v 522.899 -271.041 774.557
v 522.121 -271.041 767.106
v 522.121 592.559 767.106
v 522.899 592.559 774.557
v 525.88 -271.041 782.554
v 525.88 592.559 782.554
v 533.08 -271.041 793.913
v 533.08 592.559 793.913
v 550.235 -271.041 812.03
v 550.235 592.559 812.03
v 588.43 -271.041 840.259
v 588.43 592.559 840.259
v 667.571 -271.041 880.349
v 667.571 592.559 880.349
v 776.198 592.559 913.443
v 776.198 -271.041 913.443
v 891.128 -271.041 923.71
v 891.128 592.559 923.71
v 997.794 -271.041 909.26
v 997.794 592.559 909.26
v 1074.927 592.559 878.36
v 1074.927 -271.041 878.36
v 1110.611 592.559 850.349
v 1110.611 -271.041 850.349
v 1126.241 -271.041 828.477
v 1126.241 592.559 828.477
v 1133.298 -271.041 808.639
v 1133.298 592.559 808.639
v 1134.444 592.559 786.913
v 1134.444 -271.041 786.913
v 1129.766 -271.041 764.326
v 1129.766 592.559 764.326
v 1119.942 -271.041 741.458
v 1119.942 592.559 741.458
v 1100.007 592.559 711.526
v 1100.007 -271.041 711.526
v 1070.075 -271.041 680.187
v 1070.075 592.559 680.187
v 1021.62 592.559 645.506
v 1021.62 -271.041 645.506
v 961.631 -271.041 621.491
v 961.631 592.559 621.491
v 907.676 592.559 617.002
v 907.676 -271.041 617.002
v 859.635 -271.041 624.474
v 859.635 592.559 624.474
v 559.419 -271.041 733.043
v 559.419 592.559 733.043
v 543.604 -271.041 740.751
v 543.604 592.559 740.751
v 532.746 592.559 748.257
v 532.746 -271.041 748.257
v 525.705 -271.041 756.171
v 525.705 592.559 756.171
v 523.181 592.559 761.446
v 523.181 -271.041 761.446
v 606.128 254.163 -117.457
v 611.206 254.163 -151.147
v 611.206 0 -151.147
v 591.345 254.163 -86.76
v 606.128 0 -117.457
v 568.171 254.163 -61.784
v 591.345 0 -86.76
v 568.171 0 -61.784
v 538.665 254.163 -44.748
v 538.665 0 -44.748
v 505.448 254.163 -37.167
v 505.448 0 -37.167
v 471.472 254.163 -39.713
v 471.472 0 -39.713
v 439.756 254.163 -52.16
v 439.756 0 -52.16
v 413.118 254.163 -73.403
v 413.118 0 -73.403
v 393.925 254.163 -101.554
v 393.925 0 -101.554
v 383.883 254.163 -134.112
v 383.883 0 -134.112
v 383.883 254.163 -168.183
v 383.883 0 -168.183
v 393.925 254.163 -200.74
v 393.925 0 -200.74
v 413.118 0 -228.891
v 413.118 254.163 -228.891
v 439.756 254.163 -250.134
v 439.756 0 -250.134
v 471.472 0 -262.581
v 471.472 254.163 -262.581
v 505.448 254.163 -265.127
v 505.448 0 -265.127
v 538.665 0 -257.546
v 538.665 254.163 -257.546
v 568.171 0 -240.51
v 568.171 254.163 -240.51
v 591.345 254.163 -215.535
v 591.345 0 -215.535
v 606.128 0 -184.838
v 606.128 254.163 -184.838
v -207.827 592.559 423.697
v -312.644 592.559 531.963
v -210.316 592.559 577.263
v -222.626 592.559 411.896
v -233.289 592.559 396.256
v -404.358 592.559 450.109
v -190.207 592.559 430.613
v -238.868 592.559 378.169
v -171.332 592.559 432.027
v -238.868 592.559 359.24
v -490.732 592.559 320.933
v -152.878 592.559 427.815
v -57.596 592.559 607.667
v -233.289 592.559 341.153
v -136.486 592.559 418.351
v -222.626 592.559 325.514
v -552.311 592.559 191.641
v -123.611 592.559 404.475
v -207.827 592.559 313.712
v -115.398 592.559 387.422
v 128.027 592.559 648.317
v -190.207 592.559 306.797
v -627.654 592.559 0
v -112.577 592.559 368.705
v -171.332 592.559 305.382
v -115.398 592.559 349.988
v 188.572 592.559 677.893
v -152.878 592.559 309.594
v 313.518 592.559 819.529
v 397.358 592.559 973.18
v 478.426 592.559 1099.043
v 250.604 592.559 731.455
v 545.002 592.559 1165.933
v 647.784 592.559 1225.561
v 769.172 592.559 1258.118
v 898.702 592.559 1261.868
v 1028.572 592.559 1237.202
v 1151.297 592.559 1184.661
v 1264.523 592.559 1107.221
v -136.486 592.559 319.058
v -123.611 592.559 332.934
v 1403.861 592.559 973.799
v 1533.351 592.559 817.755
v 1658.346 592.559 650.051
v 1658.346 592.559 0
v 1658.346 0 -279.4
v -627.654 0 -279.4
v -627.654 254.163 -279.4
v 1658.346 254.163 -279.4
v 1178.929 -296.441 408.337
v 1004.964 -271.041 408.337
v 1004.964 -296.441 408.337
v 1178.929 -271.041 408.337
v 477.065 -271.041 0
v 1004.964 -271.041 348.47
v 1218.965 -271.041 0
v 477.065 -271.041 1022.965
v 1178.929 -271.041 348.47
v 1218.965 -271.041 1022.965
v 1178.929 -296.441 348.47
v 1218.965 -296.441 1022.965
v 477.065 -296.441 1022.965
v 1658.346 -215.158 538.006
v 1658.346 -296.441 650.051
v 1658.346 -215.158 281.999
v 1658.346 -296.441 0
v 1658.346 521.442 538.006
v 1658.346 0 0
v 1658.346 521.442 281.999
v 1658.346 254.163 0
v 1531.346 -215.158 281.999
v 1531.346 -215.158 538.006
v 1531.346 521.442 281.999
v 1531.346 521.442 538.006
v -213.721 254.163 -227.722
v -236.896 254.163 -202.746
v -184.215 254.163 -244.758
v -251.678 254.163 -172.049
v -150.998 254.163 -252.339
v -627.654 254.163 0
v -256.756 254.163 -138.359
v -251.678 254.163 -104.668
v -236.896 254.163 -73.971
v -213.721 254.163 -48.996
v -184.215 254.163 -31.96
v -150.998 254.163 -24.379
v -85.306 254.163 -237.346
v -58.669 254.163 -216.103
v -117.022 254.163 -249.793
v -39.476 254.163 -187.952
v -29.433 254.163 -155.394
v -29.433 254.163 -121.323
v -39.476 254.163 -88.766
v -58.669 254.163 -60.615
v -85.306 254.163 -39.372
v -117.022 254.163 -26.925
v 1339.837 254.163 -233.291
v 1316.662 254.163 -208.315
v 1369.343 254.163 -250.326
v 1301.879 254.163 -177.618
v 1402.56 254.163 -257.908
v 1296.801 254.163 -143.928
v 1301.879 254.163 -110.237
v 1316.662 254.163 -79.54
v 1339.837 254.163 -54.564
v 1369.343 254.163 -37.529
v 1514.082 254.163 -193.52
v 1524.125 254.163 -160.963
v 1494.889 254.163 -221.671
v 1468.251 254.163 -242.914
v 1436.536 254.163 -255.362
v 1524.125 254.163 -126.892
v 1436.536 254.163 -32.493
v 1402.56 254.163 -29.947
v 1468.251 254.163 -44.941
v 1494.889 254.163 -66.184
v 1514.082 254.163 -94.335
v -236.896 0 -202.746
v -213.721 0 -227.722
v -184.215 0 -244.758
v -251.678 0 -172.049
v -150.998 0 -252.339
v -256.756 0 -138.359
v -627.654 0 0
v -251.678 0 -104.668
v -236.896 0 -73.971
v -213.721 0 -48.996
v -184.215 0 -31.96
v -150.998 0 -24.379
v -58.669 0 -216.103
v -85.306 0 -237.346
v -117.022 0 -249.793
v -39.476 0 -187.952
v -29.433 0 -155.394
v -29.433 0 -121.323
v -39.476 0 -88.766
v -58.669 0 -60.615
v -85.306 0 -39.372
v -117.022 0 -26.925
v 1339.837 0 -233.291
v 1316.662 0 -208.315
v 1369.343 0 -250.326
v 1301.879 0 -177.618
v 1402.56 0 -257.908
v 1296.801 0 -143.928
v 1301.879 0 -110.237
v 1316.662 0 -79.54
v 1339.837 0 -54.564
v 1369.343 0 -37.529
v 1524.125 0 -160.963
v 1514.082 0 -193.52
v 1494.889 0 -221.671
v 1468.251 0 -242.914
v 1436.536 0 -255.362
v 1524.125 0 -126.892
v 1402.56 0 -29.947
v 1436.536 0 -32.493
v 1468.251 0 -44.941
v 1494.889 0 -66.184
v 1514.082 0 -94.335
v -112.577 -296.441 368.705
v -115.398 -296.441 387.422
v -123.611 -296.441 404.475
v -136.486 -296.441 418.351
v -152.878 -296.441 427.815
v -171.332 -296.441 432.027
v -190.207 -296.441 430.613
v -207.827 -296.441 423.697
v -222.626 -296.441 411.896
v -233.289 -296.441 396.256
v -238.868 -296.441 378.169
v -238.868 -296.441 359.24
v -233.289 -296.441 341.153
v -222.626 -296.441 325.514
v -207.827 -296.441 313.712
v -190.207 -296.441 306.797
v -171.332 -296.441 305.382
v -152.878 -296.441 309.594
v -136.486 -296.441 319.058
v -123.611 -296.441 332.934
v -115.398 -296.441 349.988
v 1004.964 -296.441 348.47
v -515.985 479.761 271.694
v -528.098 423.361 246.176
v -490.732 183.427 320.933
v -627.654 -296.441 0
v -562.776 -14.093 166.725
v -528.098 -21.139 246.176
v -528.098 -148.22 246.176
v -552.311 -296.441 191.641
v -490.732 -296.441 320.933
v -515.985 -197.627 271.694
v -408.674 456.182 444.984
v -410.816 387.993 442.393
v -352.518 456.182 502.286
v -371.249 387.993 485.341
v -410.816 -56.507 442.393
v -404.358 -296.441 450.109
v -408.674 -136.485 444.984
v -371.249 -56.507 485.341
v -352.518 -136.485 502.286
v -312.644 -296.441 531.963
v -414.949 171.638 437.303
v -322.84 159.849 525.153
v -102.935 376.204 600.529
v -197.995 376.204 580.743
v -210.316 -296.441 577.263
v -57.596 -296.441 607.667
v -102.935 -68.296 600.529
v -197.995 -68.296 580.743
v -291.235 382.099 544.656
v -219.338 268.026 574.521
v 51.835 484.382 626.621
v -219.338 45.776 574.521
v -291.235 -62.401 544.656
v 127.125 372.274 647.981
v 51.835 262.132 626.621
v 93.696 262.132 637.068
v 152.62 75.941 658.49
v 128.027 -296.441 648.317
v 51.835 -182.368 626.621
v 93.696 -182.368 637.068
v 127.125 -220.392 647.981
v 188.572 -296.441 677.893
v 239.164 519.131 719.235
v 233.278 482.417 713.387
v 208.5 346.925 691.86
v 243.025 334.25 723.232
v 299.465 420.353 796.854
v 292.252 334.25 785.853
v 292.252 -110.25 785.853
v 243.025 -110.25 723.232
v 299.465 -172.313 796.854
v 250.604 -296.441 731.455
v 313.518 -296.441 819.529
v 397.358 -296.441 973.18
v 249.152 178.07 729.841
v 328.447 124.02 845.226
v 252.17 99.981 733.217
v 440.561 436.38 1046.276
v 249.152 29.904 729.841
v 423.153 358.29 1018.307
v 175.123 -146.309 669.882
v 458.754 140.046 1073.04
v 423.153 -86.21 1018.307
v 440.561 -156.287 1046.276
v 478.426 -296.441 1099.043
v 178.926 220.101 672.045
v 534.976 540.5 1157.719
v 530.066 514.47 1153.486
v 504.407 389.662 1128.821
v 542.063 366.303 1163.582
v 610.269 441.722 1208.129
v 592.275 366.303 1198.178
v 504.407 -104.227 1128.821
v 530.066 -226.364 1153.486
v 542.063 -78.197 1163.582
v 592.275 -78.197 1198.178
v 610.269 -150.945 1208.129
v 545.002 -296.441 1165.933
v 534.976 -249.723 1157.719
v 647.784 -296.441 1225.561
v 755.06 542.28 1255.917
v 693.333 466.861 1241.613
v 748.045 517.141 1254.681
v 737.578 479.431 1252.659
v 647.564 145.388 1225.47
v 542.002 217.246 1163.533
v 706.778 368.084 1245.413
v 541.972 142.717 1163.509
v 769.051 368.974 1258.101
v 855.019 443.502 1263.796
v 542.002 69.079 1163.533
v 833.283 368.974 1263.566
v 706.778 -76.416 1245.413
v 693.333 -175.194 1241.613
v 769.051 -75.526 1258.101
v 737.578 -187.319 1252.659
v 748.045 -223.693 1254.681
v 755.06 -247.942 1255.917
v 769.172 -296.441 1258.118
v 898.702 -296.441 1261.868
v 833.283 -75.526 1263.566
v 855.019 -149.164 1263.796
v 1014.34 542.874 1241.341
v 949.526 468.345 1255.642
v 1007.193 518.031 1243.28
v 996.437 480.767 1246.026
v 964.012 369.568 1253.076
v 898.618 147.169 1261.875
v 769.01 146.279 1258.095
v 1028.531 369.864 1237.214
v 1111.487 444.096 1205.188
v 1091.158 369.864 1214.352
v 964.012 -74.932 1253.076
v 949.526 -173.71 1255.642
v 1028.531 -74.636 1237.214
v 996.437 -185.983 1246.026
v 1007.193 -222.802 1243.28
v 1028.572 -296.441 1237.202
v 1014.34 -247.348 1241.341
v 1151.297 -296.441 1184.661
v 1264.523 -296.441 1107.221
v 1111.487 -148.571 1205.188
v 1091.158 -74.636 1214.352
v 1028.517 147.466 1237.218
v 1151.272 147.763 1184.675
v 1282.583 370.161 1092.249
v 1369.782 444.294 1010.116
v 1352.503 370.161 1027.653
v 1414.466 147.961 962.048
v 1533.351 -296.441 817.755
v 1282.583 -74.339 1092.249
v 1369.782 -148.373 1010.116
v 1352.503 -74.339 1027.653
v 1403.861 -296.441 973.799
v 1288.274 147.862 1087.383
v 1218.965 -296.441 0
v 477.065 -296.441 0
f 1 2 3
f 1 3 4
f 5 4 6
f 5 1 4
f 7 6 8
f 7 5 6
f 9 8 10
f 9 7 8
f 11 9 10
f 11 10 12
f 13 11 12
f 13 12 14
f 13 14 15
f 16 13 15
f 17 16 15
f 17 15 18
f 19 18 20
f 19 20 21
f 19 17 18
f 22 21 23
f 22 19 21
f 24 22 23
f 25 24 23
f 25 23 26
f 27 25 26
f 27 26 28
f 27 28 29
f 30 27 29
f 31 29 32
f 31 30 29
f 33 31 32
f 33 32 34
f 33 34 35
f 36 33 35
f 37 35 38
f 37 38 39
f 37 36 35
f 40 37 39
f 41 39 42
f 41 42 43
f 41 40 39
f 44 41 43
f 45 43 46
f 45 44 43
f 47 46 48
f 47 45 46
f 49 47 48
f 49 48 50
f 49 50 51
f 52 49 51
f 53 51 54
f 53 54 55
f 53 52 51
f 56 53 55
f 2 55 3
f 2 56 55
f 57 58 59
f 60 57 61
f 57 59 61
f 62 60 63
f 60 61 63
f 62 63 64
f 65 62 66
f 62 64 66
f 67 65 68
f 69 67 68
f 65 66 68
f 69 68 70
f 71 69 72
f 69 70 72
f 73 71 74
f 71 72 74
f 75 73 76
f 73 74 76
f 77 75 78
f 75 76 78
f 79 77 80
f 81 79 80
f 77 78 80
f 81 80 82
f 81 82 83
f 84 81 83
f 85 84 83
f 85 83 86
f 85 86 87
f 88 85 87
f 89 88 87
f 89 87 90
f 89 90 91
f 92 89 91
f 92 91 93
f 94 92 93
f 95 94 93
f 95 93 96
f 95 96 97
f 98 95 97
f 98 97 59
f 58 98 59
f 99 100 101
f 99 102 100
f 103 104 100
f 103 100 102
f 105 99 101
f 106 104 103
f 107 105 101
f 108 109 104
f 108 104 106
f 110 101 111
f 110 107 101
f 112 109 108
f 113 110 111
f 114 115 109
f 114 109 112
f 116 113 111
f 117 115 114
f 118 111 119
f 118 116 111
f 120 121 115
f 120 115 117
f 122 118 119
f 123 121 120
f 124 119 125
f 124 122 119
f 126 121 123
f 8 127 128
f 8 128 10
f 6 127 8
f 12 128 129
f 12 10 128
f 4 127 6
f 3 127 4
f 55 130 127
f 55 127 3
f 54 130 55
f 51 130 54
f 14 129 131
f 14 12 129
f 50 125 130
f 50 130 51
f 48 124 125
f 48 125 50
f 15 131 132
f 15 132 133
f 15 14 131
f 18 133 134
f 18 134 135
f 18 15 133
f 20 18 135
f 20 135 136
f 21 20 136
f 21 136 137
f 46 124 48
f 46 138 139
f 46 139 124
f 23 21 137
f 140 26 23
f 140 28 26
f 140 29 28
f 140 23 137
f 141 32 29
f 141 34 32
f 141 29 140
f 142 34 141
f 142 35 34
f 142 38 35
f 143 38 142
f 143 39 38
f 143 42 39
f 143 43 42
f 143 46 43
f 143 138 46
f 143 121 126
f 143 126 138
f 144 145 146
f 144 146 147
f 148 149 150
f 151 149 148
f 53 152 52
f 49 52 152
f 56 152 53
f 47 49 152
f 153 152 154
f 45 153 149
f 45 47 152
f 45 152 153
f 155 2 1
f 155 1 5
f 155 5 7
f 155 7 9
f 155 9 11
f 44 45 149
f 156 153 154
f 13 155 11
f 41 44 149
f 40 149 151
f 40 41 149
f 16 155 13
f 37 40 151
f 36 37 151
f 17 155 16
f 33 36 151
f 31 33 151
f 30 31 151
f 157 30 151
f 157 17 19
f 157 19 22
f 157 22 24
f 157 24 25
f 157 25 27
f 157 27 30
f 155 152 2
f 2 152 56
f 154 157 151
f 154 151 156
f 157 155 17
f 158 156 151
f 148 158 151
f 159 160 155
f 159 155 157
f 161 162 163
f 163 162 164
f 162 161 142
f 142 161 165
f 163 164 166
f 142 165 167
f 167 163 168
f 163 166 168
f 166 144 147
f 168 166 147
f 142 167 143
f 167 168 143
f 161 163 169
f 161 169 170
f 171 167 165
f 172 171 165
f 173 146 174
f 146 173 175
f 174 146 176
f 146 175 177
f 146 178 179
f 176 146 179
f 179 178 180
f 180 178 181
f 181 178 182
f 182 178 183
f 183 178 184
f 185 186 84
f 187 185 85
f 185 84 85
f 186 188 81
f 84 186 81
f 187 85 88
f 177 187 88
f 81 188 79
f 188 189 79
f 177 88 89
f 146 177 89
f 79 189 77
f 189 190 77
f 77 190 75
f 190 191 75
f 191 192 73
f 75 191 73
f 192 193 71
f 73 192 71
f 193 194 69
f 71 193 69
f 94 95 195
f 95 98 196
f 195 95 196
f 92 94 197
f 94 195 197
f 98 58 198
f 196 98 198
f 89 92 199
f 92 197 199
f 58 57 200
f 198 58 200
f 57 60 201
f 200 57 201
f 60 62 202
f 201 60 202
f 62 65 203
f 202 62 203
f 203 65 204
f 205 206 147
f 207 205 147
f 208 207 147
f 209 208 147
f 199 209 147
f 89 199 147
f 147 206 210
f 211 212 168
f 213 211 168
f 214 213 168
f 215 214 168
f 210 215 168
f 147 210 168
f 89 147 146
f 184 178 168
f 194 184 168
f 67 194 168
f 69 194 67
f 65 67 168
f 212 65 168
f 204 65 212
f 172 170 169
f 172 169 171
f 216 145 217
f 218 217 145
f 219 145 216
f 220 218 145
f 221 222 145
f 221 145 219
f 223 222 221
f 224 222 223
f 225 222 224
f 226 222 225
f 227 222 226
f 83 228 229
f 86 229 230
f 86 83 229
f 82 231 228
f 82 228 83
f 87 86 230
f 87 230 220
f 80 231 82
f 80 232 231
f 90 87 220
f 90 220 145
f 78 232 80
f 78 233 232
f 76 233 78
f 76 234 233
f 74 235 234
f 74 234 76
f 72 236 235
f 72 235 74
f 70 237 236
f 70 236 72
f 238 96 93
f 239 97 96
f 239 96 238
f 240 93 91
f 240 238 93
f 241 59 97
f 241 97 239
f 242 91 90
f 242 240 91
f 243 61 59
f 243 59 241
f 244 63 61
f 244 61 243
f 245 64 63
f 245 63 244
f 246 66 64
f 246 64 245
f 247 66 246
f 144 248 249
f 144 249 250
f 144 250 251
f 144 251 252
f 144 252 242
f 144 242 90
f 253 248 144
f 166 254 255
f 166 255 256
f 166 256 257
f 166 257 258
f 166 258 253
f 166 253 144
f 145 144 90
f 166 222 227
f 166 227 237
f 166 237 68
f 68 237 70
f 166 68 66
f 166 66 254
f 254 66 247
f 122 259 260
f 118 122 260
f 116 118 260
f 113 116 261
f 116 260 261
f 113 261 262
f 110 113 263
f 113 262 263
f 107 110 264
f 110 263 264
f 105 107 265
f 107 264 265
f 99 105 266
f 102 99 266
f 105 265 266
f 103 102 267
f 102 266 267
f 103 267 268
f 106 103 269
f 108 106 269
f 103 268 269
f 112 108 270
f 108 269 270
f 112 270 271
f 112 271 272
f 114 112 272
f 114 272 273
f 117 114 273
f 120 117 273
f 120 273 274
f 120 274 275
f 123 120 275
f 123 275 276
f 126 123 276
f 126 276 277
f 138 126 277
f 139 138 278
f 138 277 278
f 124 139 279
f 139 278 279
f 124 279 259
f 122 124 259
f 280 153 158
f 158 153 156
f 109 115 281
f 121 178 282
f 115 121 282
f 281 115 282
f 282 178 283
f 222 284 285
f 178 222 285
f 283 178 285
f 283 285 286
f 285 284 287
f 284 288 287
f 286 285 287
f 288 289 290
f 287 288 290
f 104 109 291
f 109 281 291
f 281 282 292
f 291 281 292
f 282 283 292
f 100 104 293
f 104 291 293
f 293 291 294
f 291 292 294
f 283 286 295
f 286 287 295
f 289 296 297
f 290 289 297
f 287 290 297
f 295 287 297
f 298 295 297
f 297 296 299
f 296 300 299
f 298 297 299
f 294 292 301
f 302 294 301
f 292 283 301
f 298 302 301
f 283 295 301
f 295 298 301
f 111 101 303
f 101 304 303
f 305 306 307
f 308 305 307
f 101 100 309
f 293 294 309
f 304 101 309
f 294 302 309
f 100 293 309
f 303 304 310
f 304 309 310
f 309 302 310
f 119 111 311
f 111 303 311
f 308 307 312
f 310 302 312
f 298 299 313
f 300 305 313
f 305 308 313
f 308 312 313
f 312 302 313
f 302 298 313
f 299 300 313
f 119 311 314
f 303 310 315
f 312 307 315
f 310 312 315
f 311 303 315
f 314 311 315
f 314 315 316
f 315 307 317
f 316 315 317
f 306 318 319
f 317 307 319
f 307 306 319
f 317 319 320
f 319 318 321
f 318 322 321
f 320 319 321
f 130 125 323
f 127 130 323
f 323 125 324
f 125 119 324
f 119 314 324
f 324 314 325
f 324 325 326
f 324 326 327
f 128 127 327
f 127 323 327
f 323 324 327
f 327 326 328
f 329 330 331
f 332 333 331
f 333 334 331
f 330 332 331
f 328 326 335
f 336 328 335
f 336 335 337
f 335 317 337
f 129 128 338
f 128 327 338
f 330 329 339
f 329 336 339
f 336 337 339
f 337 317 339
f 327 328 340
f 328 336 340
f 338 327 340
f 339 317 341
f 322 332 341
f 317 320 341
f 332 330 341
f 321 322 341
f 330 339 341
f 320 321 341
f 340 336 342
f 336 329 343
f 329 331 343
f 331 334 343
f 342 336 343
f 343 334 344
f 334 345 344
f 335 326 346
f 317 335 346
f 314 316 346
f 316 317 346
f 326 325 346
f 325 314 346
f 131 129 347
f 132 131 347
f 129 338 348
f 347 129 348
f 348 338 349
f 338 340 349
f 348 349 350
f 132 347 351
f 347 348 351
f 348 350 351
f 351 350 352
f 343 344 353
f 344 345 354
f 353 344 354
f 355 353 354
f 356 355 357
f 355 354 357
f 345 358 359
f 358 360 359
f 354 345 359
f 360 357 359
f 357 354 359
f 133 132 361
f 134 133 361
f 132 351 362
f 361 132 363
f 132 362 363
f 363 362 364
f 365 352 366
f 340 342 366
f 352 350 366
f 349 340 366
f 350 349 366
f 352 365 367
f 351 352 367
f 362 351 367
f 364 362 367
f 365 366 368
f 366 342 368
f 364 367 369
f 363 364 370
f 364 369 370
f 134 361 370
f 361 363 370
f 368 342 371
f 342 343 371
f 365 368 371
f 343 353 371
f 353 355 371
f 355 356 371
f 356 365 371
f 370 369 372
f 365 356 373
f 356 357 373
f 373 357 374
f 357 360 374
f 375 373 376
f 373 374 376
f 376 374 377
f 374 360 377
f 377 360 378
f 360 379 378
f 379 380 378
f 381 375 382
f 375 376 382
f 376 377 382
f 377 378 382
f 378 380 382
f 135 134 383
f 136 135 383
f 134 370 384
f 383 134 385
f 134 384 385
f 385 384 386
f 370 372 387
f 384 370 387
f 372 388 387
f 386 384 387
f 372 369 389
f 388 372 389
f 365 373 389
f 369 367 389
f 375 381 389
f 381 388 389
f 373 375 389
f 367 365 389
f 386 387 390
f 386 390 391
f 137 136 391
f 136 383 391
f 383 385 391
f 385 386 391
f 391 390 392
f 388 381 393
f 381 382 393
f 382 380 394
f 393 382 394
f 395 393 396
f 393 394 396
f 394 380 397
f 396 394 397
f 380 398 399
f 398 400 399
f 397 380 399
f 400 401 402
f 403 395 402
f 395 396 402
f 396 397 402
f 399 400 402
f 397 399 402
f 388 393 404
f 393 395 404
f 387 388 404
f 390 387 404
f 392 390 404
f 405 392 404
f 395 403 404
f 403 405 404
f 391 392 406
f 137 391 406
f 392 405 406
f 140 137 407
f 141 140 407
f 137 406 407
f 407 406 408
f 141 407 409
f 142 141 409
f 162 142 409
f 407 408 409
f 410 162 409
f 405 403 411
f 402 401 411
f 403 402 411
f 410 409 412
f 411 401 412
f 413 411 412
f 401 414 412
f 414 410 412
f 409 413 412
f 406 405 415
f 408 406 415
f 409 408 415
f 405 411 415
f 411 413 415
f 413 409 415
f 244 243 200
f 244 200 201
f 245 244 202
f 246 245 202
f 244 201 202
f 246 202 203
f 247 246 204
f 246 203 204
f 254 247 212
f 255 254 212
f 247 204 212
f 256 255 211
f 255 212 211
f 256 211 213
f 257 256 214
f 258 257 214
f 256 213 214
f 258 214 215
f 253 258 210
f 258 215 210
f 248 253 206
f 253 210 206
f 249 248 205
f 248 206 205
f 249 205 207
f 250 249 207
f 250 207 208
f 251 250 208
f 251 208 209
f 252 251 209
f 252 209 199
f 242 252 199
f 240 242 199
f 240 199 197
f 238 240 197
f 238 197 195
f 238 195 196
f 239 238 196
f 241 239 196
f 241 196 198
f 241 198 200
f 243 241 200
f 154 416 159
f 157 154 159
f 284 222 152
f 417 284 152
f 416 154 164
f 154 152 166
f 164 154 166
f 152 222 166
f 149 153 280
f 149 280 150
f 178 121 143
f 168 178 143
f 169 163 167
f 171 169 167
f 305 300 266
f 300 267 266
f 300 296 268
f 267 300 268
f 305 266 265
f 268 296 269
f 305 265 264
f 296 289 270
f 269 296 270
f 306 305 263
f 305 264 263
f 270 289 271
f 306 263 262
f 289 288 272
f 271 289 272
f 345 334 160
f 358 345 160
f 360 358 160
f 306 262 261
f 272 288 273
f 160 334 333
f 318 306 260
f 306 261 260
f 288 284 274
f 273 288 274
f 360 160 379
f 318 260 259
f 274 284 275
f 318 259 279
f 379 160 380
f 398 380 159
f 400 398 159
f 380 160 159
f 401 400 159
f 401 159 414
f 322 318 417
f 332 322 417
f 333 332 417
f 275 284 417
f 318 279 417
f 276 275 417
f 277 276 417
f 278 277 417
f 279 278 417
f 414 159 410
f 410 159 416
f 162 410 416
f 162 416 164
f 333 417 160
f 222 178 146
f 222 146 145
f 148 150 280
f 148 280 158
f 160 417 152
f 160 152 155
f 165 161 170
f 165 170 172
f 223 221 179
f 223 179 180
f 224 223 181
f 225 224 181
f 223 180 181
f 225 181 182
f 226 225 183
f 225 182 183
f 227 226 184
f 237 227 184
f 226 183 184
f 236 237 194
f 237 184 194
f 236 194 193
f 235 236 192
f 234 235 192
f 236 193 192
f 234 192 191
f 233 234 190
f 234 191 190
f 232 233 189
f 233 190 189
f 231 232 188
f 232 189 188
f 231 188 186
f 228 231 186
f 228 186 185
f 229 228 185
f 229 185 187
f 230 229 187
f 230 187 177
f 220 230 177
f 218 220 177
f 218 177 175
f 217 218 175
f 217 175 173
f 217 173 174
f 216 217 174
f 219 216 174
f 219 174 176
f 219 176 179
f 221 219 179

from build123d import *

# Parameters (mm, degrees)
F0_W      = 2286
F0_H      = 889
F1_DEPTH  = 1778
F3_DEPTH  = 889
F5_DEPTH  = 889
F6_W      = 736.6
F6_H      = 256.0062574527
F7_DEPTH  = 127
F8_W      = 2286
F8_H      = 254.1629374027
F9_DEPTH  = 279.4
F10_R     = 114.3
F11_DEPTH = 381
F12_R     = 114.3
F13_DEPTH = 381
F14_W     = 741.9006824493
F14_H     = 1022.9654312134
F15_DEPTH = 25.4
F16_W     = 173.9646
F16_H     = 59.8678
F17_DEPTH = 25.4
F18_R     = 63.5
F19_DEPTH = 889
F20_R     = 114.3
F21_DEPTH = 381


# Not quite as in the source:
# - a feature names something its author has since deleted; it is built from what else it names


with BuildPart() as f1:
    # F0 (on Top) → F1 (new body)
    with BuildSketch(Plane.XY):
        with Locations((515.3457043618, 148.0594710579)):
            Rectangle(F0_W, F0_H)
    extrude(amount=F1_DEPTH)

    # F2 (on face) → F3 (cut)
    with BuildSketch(Plane.XZ.offset(296.4405289421)):
        with BuildLine():
            Line((-627.6542956382, 1778), (-627.6542956382, 0))
            add(Edge.make_bspline(
                [(-627.6542956382, 0), (-541.4336594546, 228.5495208712), (-378.466489085, 660.5350681174), (292.3103575218, 559.8639582491), (430.6892955486, 1252.6841744519), (1165.5216956238, 1322.9601242052), (1484.4969995752, 887.4267608137), (1658.3457043618, 650.0512957573)],
                knots=[0, 0, 0, 0, 0.2047131286, 0.3869319548, 0.5782611503, 0.7701428547, 1, 1, 1, 1], degree=3))
            Line((1658.3457043618, 650.0512957573), (1658.3457043618, 1778))
            Line((1658.3457043618, 1778), (-627.6542956382, 1778))
        make_face()
    extrude(amount=-F3_DEPTH, mode=Mode.SUBTRACT)

    # F4 (on face) → F5 (cut)
    with BuildSketch(Plane.XZ.offset(296.4405289421)):
        with BuildLine():
            add(Edge.make_bspline(
                [(522.1207141876, 767.1055197716), (519.7513293275, 813.9735385683), (815.0612749868, 989.7990248624), (1253.0272817349, 842.7583173423), (951.3919468713, 543.5567329303), (707.3552544441, 704.1588627621), (523.8330636603, 733.2341008126), (522.1207141876, 767.1055197716)],
                knots=[0, 0, 0, 0, 0.2201911252, 0.4422931214, 0.6337376897, 0.8408683353, 1, 1, 1, 1], degree=3))
        make_face()
    extrude(amount=-F5_DEPTH, mode=Mode.SUBTRACT)

    # F6 (on face) → F7 (cut)
    with BuildSketch(Plane.YZ.offset(1658.3457043618)):
        with Locations((153.1417667866, 410.0026041269)):
            Rectangle(F6_W, F6_H)
    extrude(amount=-F7_DEPTH, mode=Mode.SUBTRACT)

    # F8 (on face) → F9 (join)
    with BuildSketch(Plane(origin=(0, 0, 0), x_dir=(1, 0, 0), z_dir=(0, 0, -1))):
        with Locations((515.3457043618, -127.0814687014)):
            Rectangle(F8_W, F8_H)
    extrude(amount=F9_DEPTH)

    # F10 (on face) → F11 (cut)
    with BuildSketch(Plane(origin=(0, 254.1629374027, 0), x_dir=(-1, 0, 0), z_dir=(0, 1, 0))):
        with Locations((-1411.1014604568, -143.9275145531)):
            Circle(F10_R)
    extrude(amount=-F11_DEPTH, mode=Mode.SUBTRACT)

    # F12 (on face) → F13 (cut)
    with BuildSketch(Plane.XZ):
        with Locations((496.906042099, -151.1470973492)):
            Circle(F12_R)
    extrude(amount=-F13_DEPTH, mode=Mode.SUBTRACT)

    # F14 (on face) → F15 (cut)
    with BuildSketch(Plane.XZ.offset(296.4405289421)):
        with Locations((848.0150699615, 511.4827156067)):
            Rectangle(F14_W, F14_H)
        with BuildLine():
            add(Edge.make_bspline(
                [(522.1207141876, 767.1055197716), (519.7513293275, 813.9735385683), (815.0612749868, 989.7990248624), (1253.0272817349, 842.7583173423), (951.3919468713, 543.5567329303), (707.3552544441, 704.1588627621), (523.8330636603, 733.2341008126), (522.1207141876, 767.1055197716)],
                knots=[0, 0, 0, 0, 0.2201911252, 0.4422931214, 0.6337376897, 0.8408683353, 1, 1, 1, 1], degree=3))
        make_face(mode=Mode.SUBTRACT)
    extrude(amount=-F15_DEPTH, mode=Mode.SUBTRACT)

    # F16 (on face) → F17 (join)
    with BuildSketch(Plane.XZ.offset(271.0405289421)):
        with Locations((1091.9465520813, 378.4035745872)):
            Rectangle(F16_W, F16_H)
    extrude(amount=F17_DEPTH)

    # F18 (on face) → F19 (cut)
    with BuildSketch(Plane.XZ.offset(296.4405289421)):
        with Locations((-176.0771423578, 368.7046468258)):
            Circle(F18_R)
    extrude(amount=-F19_DEPTH, mode=Mode.SUBTRACT)

    # F20 (on face) → F21 (cut)
    with BuildSketch(Plane(origin=(0, 254.1629374027, 0), x_dir=(-1, 0, 0), z_dir=(0, 1, 0))):
        with Locations((142.4564868212, -138.3589059114)):
            Circle(F20_R)
    extrude(amount=-F21_DEPTH, mode=Mode.SUBTRACT)


solid = f1.part
